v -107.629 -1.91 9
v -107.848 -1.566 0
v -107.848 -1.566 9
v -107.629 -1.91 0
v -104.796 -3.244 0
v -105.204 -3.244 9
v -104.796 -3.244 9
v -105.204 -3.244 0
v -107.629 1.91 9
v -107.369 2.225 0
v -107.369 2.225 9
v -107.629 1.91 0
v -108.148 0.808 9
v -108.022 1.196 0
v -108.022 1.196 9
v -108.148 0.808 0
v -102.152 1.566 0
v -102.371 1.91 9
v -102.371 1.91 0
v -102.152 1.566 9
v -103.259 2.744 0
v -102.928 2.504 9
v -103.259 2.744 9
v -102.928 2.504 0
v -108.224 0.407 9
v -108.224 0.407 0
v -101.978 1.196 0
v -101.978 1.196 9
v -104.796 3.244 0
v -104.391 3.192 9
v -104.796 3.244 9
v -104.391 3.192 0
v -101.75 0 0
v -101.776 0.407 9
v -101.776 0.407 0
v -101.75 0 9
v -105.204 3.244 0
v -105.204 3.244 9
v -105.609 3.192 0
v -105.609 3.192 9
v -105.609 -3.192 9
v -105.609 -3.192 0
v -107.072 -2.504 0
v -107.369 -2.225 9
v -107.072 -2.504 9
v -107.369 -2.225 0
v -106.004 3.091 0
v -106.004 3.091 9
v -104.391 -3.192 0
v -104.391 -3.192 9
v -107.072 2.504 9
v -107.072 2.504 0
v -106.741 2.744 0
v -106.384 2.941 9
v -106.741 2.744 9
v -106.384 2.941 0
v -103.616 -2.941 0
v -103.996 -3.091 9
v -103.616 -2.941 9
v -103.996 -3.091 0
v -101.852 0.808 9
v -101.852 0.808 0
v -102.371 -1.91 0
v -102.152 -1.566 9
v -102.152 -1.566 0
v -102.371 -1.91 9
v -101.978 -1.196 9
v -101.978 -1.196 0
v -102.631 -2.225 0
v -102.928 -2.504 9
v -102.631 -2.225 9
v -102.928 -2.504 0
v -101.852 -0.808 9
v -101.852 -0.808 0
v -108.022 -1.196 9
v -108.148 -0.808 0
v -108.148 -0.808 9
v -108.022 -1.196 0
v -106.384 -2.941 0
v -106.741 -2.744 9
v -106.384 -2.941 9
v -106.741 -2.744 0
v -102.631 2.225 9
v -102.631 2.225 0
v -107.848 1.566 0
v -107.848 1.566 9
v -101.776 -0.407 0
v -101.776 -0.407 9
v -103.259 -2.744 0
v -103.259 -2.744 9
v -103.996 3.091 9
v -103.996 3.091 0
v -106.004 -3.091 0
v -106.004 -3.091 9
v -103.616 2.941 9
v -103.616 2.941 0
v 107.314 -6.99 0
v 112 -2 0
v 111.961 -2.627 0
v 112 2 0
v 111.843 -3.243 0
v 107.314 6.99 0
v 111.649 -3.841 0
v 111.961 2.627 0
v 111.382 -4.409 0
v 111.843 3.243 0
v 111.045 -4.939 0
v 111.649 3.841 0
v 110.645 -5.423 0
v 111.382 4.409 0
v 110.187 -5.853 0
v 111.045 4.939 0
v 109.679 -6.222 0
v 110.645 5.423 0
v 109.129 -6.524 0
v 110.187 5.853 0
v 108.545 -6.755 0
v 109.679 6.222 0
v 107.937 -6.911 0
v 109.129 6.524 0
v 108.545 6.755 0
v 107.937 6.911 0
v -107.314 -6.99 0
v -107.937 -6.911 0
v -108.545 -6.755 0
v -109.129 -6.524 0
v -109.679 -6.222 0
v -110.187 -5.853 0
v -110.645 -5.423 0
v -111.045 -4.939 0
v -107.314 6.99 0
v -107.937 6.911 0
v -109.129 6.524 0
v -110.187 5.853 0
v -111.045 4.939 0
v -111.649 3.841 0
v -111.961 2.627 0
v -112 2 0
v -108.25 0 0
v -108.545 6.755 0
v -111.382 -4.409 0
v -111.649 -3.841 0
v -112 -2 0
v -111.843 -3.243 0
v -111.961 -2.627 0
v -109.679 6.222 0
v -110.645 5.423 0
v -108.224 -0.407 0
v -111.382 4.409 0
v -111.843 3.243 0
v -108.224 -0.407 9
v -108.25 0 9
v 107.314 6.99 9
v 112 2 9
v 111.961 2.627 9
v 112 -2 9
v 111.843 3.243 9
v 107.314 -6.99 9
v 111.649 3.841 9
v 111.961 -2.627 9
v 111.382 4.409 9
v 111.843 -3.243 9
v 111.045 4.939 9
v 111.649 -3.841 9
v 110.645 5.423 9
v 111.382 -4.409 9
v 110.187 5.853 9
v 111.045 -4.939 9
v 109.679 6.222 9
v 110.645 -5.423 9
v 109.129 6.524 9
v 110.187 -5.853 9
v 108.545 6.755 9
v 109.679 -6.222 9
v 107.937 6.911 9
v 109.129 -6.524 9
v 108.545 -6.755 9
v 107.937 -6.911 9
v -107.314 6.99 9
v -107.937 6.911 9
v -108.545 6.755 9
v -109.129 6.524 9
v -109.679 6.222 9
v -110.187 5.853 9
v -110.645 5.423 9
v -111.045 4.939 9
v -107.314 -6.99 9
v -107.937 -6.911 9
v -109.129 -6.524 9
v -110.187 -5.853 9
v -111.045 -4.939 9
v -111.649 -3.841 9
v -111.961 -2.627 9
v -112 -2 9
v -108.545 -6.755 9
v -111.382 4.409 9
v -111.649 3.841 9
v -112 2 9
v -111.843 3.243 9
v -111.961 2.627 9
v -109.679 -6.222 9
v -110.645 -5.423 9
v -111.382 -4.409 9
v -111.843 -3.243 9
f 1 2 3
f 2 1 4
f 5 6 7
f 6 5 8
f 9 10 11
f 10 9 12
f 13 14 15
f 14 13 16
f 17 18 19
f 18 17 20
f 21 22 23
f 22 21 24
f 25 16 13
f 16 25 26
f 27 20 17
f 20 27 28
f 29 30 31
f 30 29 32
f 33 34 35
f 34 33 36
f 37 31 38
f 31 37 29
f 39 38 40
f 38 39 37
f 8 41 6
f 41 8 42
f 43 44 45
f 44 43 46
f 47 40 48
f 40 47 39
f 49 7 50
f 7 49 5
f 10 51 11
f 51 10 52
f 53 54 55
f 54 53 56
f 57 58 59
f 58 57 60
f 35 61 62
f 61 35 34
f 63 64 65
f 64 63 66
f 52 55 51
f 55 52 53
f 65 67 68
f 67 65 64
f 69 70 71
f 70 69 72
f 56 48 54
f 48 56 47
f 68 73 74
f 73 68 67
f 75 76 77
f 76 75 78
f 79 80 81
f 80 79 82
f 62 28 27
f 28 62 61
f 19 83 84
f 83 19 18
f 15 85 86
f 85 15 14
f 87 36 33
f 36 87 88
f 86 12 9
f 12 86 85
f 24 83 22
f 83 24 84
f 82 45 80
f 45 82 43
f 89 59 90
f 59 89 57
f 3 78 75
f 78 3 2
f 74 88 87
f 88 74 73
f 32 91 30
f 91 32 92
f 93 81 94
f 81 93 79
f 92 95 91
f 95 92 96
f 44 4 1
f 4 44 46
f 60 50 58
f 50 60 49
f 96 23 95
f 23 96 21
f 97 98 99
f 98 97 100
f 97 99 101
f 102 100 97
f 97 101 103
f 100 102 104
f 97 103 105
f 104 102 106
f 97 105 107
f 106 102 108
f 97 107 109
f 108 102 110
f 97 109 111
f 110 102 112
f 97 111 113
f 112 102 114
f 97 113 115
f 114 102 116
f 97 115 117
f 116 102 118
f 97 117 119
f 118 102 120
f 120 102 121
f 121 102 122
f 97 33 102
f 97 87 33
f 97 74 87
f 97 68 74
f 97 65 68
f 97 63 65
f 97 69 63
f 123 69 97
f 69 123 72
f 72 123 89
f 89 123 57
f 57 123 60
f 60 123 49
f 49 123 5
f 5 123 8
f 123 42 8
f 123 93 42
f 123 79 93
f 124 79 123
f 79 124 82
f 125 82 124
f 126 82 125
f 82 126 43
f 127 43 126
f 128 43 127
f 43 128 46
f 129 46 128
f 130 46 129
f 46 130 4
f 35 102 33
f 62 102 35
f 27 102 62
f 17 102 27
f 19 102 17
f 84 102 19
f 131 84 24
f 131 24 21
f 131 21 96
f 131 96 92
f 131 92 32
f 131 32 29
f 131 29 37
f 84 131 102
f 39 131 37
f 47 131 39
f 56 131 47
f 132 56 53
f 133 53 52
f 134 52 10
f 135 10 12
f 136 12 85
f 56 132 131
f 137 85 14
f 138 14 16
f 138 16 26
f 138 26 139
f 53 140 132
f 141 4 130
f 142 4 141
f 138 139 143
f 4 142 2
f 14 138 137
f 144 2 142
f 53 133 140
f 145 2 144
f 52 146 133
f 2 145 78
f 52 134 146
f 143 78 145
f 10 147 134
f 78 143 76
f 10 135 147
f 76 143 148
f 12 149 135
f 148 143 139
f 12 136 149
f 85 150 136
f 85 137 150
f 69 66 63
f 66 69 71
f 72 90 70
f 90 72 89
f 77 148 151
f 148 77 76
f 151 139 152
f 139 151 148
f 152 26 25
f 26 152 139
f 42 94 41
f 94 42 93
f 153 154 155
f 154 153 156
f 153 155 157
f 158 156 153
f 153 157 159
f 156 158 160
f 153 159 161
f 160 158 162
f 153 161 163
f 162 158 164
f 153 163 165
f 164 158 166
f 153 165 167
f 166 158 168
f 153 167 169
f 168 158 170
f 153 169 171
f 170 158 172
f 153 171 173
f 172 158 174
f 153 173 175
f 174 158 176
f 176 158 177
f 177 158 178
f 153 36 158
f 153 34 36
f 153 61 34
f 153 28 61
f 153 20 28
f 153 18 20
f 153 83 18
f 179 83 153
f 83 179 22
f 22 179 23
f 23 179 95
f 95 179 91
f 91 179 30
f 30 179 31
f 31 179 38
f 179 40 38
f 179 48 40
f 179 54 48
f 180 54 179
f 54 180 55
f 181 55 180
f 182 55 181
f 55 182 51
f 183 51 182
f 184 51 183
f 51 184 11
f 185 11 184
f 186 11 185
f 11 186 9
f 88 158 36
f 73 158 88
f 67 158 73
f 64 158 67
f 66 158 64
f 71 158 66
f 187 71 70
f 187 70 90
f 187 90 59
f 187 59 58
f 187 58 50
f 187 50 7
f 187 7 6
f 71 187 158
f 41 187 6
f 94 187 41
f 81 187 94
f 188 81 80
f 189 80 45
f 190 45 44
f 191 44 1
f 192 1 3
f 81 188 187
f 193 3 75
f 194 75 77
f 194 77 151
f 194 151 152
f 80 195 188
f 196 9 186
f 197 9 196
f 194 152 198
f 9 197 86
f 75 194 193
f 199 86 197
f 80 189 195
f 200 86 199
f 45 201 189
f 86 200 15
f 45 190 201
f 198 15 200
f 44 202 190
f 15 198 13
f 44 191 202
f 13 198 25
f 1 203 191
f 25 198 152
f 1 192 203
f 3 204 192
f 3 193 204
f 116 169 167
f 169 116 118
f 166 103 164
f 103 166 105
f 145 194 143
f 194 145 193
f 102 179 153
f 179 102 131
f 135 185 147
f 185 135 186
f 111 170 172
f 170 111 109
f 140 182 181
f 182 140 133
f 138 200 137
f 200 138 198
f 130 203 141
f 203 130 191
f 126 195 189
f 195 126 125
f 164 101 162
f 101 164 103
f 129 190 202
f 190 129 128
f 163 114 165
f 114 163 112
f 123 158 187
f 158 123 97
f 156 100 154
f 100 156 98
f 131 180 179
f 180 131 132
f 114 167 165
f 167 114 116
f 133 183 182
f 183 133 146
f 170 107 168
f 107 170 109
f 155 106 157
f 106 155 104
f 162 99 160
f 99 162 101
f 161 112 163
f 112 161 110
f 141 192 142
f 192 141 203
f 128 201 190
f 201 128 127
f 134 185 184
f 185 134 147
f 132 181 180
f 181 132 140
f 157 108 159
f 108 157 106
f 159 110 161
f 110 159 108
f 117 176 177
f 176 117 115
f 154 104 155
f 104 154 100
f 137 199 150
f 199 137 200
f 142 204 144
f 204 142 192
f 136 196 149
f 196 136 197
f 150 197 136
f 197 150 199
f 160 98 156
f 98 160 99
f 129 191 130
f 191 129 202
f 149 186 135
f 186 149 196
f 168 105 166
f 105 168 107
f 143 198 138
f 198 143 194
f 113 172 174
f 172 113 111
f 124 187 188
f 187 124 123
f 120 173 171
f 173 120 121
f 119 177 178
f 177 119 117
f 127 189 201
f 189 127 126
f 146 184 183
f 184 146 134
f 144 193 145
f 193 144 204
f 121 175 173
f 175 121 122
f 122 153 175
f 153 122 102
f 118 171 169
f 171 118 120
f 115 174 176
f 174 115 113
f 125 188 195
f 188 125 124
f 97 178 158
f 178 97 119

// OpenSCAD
$fn = 50;


difference() {
	union() {
		hull() {
			translate(v = [-107.0000000000, 2.0000000000, 0]) {
				cylinder(h = 9, r = 5);
			}
			translate(v = [107.0000000000, 2.0000000000, 0]) {
				cylinder(h = 9, r = 5);
			}
			translate(v = [-107.0000000000, -2.0000000000, 0]) {
				cylinder(h = 9, r = 5);
			}
			translate(v = [107.0000000000, -2.0000000000, 0]) {
				cylinder(h = 9, r = 5);
			}
		}
	}
	union() {
		translate(v = [-105.0000000000, 0.0000000000, 0]) {
			cylinder(h = 9, r = 3.2500000000);
		}
		translate(v = [-105.0000000000, 0.0000000000, 0]) {
			cylinder(h = 9, r = 1.8000000000);
		}
		translate(v = [-105.0000000000, 0.0000000000, 0]) {
			cylinder(h = 9, r = 1.8000000000);
		}
		translate(v = [-105.0000000000, 0.0000000000, 0]) {
			cylinder(h = 9, r = 1.8000000000);
		}
	}
}
